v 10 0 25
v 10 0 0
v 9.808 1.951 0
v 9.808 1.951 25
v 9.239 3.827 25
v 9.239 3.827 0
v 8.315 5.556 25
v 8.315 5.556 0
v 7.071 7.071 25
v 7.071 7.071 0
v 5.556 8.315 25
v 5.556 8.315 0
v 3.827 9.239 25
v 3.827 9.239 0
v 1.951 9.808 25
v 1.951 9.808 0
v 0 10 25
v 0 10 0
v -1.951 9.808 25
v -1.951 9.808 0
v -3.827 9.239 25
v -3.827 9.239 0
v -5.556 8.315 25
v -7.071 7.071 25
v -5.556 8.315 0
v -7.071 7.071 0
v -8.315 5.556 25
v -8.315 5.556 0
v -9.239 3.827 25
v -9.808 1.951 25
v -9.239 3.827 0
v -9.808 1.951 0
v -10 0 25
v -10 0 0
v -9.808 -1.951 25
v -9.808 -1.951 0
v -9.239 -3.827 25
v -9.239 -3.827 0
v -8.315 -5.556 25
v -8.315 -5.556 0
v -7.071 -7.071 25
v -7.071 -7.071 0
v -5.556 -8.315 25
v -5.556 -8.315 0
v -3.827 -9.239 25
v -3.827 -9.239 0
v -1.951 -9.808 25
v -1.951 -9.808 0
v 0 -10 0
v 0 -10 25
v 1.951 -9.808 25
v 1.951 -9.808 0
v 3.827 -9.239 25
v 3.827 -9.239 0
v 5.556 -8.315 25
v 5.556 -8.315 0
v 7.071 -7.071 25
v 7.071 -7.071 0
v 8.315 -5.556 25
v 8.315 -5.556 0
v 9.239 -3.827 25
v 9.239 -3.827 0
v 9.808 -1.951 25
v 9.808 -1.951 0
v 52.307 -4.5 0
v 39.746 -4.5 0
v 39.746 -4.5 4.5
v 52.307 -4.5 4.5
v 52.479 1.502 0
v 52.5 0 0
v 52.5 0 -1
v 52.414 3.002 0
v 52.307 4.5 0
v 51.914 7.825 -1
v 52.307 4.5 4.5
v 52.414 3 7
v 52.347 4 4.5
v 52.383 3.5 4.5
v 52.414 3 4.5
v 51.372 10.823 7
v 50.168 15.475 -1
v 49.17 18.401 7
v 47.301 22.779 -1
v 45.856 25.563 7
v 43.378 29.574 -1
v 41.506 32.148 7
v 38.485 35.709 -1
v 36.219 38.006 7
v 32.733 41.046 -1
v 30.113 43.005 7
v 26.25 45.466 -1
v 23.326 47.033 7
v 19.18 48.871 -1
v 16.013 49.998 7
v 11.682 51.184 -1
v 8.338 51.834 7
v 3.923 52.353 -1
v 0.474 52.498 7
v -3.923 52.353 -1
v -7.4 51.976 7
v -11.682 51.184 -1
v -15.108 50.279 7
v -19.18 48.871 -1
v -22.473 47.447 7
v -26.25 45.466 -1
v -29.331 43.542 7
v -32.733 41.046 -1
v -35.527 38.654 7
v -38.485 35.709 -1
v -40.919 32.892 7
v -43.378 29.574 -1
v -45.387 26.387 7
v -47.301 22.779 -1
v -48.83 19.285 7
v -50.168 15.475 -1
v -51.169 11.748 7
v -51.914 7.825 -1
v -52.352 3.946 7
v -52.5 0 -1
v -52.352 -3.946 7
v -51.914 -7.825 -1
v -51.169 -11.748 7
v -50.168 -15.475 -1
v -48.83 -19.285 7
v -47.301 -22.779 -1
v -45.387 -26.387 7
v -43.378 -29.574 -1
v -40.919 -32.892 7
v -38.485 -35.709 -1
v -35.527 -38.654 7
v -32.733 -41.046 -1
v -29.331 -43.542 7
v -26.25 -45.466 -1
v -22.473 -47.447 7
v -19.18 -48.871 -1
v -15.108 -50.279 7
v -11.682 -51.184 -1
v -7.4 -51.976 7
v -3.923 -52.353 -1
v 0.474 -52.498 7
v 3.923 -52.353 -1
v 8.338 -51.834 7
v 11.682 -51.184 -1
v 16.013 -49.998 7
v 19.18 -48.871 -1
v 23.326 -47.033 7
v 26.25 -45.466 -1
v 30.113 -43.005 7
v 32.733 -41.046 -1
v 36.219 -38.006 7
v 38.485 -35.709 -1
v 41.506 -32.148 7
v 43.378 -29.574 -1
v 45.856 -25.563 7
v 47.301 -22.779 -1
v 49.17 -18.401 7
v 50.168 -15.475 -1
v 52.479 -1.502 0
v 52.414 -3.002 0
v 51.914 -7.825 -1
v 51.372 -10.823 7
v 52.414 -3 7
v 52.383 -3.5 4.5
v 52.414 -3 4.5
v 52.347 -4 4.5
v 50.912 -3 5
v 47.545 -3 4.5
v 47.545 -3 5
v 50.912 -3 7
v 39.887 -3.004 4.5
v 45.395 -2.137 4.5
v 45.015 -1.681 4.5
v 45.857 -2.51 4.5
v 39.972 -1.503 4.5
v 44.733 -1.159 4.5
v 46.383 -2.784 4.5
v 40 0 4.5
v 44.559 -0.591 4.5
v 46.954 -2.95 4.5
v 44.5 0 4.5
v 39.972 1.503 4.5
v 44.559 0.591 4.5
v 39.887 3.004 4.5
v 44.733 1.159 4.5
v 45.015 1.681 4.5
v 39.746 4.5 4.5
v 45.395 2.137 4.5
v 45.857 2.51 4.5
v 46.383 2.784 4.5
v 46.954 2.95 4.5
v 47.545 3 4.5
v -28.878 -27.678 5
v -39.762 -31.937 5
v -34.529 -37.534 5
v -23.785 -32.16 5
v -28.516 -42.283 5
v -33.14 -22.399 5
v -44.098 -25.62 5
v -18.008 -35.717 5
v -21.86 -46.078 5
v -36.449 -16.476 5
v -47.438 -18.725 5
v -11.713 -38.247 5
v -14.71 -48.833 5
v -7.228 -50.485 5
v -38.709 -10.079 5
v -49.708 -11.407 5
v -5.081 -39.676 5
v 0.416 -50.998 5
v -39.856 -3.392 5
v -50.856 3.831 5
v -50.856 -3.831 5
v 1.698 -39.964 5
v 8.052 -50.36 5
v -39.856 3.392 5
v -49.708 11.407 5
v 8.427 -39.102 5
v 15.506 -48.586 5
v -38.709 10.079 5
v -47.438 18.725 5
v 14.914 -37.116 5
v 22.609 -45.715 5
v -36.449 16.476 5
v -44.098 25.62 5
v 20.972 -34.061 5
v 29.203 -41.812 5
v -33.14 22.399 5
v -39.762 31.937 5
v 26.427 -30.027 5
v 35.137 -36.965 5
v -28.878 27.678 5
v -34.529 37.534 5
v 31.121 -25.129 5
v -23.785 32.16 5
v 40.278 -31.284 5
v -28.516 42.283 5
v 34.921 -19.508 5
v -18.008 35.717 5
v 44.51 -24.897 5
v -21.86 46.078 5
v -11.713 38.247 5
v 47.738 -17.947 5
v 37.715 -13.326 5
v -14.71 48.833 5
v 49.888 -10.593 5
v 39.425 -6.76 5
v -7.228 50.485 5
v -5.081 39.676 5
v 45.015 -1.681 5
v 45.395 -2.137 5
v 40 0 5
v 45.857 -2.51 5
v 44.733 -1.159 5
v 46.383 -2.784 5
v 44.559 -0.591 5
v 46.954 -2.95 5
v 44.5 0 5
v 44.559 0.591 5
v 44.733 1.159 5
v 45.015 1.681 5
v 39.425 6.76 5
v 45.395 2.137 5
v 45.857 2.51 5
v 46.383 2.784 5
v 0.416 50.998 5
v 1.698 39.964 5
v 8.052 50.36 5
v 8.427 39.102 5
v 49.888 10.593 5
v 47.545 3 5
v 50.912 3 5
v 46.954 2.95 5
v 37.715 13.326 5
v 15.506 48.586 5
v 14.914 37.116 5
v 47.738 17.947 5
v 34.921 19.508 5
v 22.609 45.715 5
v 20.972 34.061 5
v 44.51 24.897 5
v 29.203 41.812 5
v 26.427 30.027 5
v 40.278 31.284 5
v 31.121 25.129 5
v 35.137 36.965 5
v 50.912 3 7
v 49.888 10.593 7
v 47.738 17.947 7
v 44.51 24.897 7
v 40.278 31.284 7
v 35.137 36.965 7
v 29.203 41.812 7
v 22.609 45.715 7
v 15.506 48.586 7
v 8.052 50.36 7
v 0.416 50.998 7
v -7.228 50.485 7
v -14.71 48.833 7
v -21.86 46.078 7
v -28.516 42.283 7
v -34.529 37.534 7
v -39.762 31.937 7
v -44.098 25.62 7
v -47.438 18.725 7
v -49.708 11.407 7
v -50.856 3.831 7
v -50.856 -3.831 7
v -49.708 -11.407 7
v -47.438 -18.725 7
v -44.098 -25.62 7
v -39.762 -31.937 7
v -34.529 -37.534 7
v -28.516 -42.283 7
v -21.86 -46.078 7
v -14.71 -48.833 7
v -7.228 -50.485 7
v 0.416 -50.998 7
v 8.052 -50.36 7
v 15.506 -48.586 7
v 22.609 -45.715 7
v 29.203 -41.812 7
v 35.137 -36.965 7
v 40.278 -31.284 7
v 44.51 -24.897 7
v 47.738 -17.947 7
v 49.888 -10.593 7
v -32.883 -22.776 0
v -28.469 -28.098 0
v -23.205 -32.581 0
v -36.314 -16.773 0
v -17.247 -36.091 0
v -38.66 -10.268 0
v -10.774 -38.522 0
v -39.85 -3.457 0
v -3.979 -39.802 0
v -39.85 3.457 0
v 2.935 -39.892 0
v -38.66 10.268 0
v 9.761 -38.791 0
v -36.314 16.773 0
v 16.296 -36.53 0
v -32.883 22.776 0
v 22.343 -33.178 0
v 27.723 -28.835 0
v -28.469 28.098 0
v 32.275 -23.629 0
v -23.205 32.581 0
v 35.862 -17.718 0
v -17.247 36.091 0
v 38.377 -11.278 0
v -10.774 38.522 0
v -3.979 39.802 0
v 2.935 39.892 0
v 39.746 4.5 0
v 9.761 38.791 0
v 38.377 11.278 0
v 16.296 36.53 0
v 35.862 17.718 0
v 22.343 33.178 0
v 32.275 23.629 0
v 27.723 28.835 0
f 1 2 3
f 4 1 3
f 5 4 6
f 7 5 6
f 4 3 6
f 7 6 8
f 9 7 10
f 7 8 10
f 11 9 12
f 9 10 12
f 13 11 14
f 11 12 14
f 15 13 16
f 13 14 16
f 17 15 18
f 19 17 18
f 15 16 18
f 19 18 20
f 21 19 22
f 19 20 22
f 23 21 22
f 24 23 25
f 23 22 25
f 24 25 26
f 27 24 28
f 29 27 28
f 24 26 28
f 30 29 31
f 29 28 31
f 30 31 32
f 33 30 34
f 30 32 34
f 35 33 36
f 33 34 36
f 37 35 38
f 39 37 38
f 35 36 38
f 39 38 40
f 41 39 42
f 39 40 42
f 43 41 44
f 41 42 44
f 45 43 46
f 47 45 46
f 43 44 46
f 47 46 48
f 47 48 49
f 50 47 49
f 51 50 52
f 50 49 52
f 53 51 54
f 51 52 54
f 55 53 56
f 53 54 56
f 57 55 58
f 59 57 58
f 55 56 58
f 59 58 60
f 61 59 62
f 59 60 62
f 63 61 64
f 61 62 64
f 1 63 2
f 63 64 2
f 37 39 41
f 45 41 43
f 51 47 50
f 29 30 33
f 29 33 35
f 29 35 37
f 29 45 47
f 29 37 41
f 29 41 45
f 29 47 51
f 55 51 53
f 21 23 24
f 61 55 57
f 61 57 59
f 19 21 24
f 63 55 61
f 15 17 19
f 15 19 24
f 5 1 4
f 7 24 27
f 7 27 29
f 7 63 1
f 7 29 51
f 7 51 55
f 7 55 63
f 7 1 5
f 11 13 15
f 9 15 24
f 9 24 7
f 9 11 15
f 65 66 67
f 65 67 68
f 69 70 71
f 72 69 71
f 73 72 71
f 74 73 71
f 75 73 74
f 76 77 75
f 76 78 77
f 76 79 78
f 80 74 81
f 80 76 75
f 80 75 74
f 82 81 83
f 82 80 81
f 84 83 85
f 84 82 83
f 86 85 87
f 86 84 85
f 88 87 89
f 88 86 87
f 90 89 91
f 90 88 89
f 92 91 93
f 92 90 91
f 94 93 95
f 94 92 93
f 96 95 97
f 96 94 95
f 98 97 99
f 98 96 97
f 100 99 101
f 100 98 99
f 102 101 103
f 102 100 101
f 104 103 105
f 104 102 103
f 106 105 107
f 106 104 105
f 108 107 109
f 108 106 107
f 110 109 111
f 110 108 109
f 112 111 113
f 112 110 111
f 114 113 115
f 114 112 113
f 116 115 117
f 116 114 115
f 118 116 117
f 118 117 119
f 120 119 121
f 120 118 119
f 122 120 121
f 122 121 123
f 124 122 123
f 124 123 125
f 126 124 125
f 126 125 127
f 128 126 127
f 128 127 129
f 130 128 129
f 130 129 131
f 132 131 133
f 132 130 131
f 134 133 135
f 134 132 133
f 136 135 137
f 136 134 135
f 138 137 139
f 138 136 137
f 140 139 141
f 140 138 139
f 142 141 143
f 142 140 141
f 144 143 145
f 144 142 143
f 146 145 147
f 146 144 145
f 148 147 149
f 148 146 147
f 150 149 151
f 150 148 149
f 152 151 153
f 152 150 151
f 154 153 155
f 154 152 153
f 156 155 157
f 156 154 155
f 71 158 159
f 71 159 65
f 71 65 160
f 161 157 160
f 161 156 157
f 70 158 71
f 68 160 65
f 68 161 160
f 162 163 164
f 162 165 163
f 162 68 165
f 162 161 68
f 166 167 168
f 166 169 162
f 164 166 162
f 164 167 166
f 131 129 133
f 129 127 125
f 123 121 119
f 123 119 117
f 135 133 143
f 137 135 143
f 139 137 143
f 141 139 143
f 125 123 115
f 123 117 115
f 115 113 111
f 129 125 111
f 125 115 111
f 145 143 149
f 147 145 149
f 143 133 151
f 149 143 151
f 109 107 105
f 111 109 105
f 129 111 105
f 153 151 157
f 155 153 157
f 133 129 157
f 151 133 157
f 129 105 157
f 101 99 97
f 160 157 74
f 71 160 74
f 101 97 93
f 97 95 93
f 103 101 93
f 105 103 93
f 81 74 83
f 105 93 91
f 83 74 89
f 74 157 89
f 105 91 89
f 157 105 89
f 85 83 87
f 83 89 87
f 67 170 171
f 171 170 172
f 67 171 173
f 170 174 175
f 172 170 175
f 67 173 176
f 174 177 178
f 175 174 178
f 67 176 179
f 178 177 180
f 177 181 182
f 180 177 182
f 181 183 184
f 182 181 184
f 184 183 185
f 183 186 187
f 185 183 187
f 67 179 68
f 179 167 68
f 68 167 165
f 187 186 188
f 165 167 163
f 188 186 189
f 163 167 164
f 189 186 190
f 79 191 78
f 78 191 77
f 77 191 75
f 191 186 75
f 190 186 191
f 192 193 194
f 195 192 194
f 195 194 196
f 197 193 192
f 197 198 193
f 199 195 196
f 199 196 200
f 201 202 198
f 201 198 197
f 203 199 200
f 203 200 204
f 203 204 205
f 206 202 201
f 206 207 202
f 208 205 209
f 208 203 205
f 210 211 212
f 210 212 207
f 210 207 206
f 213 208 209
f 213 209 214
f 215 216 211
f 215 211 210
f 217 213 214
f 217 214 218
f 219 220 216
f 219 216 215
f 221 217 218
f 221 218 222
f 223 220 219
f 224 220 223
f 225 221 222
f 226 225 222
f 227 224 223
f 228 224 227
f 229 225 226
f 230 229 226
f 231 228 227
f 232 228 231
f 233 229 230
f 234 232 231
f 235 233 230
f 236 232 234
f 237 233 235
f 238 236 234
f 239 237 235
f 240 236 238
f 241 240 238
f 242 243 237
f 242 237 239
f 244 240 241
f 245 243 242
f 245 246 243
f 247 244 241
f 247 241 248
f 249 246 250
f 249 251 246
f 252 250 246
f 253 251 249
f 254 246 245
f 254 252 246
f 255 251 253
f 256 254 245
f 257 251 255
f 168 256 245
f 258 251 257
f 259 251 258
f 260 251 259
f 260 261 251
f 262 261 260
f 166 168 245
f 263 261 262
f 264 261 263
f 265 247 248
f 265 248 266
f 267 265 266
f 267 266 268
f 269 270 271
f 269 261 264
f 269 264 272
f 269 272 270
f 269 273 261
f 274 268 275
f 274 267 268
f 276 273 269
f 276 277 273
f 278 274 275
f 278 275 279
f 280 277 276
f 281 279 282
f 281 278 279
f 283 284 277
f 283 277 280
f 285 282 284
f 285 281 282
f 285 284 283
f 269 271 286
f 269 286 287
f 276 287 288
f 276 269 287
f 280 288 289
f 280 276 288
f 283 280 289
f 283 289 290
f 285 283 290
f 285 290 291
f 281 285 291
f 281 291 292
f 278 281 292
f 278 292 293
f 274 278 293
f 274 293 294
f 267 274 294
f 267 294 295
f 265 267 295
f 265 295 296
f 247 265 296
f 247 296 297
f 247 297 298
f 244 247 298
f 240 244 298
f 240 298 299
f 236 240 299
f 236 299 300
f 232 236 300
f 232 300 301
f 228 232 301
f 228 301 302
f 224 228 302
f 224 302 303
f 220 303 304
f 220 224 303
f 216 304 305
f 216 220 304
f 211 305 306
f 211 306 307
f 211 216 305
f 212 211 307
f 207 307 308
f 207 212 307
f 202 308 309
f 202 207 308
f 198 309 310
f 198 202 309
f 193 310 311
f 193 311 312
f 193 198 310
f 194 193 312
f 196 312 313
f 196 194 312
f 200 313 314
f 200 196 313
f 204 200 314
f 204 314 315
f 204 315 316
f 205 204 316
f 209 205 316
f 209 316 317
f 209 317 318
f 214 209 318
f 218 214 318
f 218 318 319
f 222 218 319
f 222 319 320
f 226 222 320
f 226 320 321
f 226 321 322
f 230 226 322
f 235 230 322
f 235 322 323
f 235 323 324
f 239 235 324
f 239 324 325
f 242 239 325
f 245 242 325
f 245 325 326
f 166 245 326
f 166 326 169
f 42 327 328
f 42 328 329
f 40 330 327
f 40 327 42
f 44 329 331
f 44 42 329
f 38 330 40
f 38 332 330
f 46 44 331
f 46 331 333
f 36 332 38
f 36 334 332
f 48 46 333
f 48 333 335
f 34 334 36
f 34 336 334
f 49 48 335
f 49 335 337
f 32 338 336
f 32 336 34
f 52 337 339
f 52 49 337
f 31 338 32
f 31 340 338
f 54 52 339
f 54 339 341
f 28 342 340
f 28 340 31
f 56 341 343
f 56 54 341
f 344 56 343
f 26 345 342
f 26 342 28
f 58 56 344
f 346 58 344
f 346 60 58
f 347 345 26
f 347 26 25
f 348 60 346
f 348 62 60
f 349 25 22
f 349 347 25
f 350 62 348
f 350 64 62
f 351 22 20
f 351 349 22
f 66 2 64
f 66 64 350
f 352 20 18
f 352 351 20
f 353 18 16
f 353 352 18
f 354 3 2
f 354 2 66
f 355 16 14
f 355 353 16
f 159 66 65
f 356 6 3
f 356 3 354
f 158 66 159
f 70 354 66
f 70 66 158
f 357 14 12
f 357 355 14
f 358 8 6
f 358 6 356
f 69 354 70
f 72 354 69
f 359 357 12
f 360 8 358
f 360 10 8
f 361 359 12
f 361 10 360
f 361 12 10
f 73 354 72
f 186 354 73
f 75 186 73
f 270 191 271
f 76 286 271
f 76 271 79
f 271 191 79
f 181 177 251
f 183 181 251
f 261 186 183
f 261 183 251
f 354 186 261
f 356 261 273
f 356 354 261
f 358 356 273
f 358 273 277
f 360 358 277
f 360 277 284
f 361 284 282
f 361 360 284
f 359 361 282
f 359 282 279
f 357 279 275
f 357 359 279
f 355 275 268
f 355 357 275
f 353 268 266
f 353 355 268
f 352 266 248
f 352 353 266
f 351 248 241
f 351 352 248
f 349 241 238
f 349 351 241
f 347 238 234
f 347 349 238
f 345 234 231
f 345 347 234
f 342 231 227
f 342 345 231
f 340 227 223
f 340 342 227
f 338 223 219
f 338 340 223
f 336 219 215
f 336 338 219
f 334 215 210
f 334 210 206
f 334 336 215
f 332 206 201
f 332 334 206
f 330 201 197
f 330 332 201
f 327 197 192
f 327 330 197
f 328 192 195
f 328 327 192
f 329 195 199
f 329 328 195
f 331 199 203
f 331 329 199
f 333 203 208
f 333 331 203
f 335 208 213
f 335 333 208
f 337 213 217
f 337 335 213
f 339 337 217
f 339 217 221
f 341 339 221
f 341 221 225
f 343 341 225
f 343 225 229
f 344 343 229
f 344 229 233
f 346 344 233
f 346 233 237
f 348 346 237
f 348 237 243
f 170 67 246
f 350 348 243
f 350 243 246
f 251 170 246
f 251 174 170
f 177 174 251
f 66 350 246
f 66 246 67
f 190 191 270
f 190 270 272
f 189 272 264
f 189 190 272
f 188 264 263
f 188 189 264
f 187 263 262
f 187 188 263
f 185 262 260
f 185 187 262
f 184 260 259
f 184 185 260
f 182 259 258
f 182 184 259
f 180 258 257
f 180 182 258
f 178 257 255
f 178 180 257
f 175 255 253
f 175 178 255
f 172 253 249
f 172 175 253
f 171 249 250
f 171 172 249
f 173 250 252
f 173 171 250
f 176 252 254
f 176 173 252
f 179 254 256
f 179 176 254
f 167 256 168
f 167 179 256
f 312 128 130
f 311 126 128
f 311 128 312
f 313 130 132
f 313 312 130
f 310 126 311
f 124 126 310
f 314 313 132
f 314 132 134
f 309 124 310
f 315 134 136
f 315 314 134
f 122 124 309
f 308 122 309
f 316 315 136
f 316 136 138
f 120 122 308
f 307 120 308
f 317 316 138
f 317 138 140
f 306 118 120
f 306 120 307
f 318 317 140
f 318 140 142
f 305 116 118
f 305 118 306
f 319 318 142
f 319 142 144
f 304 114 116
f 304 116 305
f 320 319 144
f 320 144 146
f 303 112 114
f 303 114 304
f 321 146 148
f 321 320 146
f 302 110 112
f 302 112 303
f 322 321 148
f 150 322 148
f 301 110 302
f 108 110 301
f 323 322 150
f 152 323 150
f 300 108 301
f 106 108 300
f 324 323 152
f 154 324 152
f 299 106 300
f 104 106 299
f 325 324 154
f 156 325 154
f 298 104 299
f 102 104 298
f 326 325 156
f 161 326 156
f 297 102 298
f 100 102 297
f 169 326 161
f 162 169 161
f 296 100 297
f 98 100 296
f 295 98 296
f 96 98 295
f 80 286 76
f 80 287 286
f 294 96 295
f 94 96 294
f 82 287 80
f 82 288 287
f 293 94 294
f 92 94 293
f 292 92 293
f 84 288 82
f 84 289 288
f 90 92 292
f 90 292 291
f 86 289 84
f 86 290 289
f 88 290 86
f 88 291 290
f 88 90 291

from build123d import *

# Parameters (mm, degrees)
F0_R      = 52.5
F0_R_2    = 51
F0_R_3    = 40
F1_DEPTH  = 1
F2_DEPTH  = 5
F3_DEPTH  = 7
F4_W      = 20
F4_H      = 9
F5_DEPTH  = 4.5
F6_R      = 3
F7_DEPTH  = 7.001
F8_W      = 8.0645383788
F8_H      = 6
F9_DEPTH  = 10
F10_R     = 10
F11_DEPTH = 25


with BuildPart() as f1:
    # F0 (on Top) → F1 (new body)
    with BuildSketch(Plane.XY):
        Circle(F0_R)
        Circle(F0_R_2, mode=Mode.SUBTRACT)
        Circle(F0_R_2)
        Circle(F0_R_3, mode=Mode.SUBTRACT)
        Circle(F0_R_3)
    extrude(amount=-F1_DEPTH)

    # F0 (on Top) → F2 (join)
    with BuildSketch(Plane.XY):
        Circle(F0_R_2)
        Circle(F0_R_3, mode=Mode.SUBTRACT)
    extrude(amount=F2_DEPTH)

    # F0 (on Top) → F3 (join)
    with BuildSketch(Plane.XY):
        Circle(F0_R)
        Circle(F0_R_2, mode=Mode.SUBTRACT)
    extrude(amount=F3_DEPTH)

    # F4 (on Top) → F5 (cut)
    with BuildSketch(Plane.XY):
        with Locations((45, 0)):
            Rectangle(F4_W, F4_H)
    extrude(amount=F5_DEPTH, mode=Mode.SUBTRACT)

    # F6 (on Top) → F7 (cut, through all)
    with BuildSketch(Plane.XY):
        with Locations((47.5, 0)):
            Circle(F6_R)
    extrude(amount=F7_DEPTH, mode=Mode.SUBTRACT)

    # F8 (on Top) → F9 (cut)
    with BuildSketch(Plane.XY):
        with Locations((51.5776195013, 0)):
            Rectangle(F8_W, F8_H)
    extrude(amount=F9_DEPTH, mode=Mode.SUBTRACT)

    # F10 (on face) → F11 (join)
    with BuildSketch(Plane.XY):
        Circle(F10_R)
    extrude(amount=F11_DEPTH)


solid = f1.part
